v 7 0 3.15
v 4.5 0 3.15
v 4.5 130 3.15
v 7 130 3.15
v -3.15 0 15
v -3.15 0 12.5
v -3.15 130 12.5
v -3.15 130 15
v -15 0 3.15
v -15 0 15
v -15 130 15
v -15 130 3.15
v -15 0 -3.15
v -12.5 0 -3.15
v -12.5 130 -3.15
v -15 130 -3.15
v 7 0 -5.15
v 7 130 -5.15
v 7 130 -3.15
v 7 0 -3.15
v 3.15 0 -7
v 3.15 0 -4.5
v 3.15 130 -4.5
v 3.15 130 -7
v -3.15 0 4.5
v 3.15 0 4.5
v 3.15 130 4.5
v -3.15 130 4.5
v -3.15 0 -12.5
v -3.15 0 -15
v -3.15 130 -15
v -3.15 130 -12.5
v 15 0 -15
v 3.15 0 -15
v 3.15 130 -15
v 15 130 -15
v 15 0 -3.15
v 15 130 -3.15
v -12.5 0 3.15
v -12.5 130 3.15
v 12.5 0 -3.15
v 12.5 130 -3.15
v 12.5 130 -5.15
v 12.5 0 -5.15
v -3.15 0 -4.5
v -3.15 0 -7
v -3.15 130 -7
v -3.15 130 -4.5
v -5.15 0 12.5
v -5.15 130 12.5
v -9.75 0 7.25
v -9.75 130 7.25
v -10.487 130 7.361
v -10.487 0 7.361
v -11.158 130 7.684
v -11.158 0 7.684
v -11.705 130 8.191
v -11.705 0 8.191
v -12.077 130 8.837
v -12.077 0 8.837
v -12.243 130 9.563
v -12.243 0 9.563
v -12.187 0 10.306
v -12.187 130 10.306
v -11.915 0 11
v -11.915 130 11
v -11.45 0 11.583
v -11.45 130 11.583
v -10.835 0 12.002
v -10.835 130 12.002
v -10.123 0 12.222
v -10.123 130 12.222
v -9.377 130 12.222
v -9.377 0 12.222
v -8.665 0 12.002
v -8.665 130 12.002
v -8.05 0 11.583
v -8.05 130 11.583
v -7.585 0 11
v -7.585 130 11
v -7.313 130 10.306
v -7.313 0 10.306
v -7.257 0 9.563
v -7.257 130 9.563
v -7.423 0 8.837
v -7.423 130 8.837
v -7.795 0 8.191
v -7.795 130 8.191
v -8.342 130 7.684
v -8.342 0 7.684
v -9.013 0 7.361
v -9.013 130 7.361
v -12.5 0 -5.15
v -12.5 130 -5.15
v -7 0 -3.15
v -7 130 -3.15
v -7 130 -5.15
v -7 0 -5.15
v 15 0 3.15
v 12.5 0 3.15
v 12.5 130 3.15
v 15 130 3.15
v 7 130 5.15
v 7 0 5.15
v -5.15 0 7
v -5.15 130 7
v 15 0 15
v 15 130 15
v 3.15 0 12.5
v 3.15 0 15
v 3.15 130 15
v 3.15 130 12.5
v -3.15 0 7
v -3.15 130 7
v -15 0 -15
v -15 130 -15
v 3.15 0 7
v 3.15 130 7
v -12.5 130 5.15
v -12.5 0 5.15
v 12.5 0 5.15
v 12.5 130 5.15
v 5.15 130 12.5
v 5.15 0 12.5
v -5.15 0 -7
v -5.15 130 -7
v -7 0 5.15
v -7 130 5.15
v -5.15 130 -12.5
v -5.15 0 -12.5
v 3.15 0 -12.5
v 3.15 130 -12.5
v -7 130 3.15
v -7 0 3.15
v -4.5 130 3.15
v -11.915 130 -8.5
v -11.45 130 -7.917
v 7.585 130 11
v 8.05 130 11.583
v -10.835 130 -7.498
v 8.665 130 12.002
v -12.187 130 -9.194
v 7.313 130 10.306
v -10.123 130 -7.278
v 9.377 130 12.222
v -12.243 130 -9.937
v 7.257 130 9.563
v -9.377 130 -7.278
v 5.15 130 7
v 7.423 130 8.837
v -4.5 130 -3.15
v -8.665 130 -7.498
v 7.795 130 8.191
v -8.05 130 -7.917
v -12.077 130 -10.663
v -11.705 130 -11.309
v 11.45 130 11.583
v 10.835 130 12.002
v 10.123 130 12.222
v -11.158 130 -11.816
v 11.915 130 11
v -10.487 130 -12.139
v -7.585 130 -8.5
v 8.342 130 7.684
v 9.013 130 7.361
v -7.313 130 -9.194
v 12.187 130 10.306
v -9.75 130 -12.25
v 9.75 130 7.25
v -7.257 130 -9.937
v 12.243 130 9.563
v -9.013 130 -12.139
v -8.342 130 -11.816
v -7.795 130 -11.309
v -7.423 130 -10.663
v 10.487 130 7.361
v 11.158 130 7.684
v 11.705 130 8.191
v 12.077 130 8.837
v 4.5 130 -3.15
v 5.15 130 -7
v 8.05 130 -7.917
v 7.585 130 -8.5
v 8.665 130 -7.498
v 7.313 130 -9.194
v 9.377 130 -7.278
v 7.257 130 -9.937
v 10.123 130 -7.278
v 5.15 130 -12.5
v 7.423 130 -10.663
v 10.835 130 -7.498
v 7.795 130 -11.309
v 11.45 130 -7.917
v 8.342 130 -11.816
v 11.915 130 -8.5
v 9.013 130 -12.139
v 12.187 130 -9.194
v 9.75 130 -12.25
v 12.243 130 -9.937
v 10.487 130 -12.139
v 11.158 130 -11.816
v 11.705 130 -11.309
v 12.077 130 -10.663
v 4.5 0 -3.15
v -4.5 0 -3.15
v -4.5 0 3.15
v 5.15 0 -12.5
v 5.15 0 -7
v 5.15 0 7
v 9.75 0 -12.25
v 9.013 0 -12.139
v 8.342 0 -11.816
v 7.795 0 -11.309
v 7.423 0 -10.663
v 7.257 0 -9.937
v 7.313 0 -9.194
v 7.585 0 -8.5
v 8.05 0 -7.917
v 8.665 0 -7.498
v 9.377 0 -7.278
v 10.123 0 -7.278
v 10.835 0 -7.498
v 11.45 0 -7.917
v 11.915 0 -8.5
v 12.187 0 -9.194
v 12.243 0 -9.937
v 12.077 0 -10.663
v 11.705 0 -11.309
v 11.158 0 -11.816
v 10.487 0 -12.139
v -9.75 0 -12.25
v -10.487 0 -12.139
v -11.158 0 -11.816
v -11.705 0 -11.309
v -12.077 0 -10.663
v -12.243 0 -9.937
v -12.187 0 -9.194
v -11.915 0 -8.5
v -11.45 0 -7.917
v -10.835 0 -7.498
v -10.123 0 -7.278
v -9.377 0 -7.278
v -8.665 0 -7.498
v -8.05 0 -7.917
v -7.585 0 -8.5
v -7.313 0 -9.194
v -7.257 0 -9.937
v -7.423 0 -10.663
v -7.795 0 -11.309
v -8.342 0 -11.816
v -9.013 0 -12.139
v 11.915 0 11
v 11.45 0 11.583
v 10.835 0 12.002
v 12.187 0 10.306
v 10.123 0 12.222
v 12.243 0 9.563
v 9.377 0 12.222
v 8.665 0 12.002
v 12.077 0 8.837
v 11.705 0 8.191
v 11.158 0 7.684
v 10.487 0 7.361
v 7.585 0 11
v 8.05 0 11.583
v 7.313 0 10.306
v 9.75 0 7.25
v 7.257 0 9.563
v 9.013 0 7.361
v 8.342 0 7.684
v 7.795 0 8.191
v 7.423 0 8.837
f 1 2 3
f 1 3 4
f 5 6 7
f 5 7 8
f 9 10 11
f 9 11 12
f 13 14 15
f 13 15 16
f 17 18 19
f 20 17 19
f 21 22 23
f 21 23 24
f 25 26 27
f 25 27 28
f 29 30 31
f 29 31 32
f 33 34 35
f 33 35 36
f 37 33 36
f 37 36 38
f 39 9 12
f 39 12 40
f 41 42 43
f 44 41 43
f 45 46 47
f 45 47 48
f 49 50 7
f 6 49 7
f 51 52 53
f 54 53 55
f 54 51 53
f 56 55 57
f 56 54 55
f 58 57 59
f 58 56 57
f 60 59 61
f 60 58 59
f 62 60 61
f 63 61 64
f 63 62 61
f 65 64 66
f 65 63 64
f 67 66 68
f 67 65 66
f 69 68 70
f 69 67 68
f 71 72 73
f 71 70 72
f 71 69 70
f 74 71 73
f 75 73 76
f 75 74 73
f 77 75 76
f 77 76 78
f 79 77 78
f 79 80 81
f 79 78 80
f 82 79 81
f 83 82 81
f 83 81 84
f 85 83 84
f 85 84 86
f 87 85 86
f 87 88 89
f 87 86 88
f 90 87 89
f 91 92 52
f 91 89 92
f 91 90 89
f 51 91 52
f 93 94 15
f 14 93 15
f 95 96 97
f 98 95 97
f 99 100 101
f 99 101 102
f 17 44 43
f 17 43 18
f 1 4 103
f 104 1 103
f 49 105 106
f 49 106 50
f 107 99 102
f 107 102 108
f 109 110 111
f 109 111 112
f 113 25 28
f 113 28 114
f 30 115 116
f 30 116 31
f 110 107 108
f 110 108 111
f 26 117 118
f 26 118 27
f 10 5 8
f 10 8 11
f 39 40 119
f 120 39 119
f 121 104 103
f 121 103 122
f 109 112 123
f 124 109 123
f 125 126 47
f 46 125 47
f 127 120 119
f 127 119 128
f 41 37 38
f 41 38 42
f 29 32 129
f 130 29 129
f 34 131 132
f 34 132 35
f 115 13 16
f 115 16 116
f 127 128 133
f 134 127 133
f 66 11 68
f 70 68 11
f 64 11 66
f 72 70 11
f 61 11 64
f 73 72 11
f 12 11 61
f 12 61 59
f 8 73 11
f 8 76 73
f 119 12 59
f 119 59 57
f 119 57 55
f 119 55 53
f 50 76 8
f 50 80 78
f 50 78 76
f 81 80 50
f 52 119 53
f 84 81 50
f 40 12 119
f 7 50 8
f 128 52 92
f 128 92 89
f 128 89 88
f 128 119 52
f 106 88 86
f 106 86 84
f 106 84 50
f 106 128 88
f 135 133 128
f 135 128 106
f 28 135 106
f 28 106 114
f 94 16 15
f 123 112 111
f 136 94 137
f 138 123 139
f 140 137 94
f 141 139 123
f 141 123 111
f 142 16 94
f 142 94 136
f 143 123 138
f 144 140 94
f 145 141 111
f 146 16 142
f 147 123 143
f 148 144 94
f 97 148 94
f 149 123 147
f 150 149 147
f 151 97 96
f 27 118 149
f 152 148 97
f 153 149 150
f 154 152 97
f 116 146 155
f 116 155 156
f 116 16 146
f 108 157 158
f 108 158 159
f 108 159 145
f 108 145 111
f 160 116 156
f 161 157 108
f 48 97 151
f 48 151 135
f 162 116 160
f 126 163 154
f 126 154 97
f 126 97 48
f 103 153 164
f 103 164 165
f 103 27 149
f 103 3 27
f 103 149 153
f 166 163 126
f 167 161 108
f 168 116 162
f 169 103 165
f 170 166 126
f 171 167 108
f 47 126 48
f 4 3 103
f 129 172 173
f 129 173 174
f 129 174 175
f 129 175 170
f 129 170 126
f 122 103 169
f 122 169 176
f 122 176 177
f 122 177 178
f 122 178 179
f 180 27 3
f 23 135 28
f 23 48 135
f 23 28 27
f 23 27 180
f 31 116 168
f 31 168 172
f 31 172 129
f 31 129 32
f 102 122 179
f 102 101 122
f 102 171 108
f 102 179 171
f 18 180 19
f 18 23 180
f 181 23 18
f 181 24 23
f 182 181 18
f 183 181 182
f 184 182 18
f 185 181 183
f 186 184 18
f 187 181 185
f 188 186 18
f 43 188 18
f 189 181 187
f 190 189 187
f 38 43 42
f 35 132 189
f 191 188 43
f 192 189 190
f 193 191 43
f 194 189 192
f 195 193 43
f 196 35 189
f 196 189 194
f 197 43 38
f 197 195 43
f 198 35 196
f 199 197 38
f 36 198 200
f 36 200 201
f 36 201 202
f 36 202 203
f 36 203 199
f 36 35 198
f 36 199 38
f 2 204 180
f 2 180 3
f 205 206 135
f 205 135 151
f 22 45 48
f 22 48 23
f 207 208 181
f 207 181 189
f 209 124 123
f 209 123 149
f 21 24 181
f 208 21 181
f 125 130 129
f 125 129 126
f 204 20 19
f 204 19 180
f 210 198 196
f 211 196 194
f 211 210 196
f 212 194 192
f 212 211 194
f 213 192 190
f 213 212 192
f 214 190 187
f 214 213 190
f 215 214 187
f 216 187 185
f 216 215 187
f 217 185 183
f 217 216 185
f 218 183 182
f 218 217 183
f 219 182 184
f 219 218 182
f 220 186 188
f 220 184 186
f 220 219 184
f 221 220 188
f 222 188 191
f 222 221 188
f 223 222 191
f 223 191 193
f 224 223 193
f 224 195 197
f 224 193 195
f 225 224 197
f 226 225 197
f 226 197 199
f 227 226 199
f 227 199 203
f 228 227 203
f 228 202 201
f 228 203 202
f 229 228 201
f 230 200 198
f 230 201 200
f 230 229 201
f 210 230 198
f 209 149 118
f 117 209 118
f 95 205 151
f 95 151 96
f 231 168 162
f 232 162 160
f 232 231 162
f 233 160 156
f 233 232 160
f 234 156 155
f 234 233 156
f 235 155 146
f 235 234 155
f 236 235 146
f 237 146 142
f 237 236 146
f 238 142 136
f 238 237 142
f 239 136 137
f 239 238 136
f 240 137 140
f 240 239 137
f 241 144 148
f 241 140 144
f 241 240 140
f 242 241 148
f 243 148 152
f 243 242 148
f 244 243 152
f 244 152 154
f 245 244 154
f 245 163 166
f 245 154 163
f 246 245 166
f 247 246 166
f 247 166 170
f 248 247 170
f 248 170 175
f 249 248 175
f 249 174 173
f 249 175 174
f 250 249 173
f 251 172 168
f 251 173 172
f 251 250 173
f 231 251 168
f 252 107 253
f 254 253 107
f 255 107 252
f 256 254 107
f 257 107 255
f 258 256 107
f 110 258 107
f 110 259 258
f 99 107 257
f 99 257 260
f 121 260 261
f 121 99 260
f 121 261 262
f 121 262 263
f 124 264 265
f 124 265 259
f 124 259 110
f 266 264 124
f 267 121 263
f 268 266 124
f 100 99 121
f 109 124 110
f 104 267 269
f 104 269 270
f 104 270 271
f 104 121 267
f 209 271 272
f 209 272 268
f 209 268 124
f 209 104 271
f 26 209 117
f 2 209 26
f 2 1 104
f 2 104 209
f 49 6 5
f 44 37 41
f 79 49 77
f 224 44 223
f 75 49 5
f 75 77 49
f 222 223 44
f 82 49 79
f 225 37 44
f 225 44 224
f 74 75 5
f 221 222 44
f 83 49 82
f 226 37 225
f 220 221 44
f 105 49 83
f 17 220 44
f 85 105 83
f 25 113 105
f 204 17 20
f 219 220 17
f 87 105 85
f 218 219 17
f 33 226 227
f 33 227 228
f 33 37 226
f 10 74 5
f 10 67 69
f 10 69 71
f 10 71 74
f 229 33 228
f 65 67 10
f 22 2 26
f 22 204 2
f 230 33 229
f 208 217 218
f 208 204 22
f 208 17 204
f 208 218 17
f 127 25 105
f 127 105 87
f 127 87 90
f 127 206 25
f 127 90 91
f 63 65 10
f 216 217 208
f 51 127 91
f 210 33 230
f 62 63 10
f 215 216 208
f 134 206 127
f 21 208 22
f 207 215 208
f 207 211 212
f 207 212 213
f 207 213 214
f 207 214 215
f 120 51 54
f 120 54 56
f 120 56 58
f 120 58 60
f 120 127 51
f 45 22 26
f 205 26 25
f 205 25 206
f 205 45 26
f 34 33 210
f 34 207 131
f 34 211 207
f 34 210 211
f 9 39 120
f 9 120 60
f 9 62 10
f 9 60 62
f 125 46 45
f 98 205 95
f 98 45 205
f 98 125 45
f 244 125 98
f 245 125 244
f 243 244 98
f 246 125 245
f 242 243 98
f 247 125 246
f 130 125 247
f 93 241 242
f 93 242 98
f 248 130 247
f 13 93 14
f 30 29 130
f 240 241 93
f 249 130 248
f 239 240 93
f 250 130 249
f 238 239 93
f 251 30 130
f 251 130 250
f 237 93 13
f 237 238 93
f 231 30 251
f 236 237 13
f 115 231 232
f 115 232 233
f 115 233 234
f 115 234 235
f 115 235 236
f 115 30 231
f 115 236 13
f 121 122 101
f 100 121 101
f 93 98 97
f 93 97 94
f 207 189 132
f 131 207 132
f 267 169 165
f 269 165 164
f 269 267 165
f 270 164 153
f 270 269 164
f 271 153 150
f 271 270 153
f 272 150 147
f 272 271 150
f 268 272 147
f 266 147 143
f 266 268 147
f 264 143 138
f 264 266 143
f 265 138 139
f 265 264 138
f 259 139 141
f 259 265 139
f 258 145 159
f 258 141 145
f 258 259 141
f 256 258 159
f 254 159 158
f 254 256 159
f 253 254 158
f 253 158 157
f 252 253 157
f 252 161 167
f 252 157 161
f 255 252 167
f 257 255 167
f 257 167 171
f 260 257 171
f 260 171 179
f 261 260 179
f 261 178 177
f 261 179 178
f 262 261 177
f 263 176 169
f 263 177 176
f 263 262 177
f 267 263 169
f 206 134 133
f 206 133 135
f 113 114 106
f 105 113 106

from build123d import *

# Parameters (mm, degrees)
SKETCH_1_R          = 2.5
EXTRUDE_1_DEPTH     = 180
SKETCH_2_R          = 82.250528809
CUT_EXTRUDE_1_DEPTH = 10
SKETCH_3_R          = 47.359827943
CUT_EXTRUDE_2_DEPTH = 200
SKETCH_4_R          = 50.055938799
CUT_EXTRUDE_3_DEPTH = 30
SKETCH_5_R          = 35.776746529
CUT_EXTRUDE_4_DEPTH = 40
SKETCH_1_3_R        = 2.5
EXTRUDE_2_DEPTH     = 200
SKETCH_6_R          = 45.508426161
CUT_EXTRUDE_5_DEPTH = 50
SKETCH_7_R          = 85.251485325
CUT_EXTRUDE_7_DEPTH = 20


with BuildPart() as part:
    # 草图1 → 凸台-拉伸1 (new, symmetric)
    with BuildSketch(Plane(origin=(0, 0, 0), x_dir=(1, 0, 0), z_dir=(0, 1, 0))):
        Polygon((-15, -3.15), (-12.5, -3.15), (-12.5, -5.15), (-7, -5.15), (-7, -3.15), (-4.5, -3.15), (-4.5, 3.15), (-7, 3.15), (-7, 5.15), (-12.5, 5.15), (-12.5, 3.15), (-15, 3.15), (-15, 15), (-3.15, 15), (-3.15, 12.5), (-5.15, 12.5), (-5.15, 7), (-3.15, 7), (-3.15, 4.5), (3.15, 4.5), (3.15, 7), (5.15, 7), (5.15, 12.5), (3.15, 12.5), (3.15, 15), (15, 15), (15, 3.15), (12.5, 3.15), (12.5, 5.15), (7, 5.15), (7, 3.15), (4.5, 3.15), (4.5, -3.15), (7, -3.15), (7, -5.15), (12.5, -5.15), (12.5, -3.15), (15, -3.15), (15, -15), (3.15, -15), (3.15, -12.5), (5.15, -12.5), (5.15, -7), (3.15, -7), (3.15, -4.5), (-3.15, -4.5), (-3.15, -7), (-5.15, -7), (-5.15, -12.5), (-3.15, -12.5), (-3.15, -15), (-15, -15), align=None)
        with Locations((-9.75, -9.75)):
            Circle(SKETCH_1_R, mode=Mode.SUBTRACT)
        with Locations((-9.75, 9.75)):
            Circle(SKETCH_1_R, mode=Mode.SUBTRACT)
        with Locations((9.75, 9.75)):
            Circle(SKETCH_1_R, mode=Mode.SUBTRACT)
        with Locations((9.75, -9.75)):
            Circle(SKETCH_1_R, mode=Mode.SUBTRACT)
    extrude(amount=EXTRUDE_1_DEPTH, both=True)

    # 草图2 → 切除-拉伸1 (cut)
    with BuildSketch(Plane(origin=(0, 180, 0), x_dir=(1, 0, 0), z_dir=(0, 1, 0))):
        Circle(SKETCH_2_R)
    extrude(amount=-CUT_EXTRUDE_1_DEPTH, mode=Mode.SUBTRACT)

    # 草图3 → 切除-拉伸2 (cut)
    with BuildSketch(Plane.XZ.offset(180)):
        with Locations((0.216432031, -1.772037256)):
            Circle(SKETCH_3_R)
    extrude(amount=-CUT_EXTRUDE_2_DEPTH, mode=Mode.SUBTRACT)

    # 草图4 → 切除-拉伸3 (cut)
    with BuildSketch(Plane.XZ.offset(-20)):
        with Locations((-1.287426062, -1.543634952)):
            Circle(SKETCH_4_R)
    extrude(amount=-CUT_EXTRUDE_3_DEPTH, mode=Mode.SUBTRACT)

    # 草图5 → 切除-拉伸4 (cut)
    with BuildSketch(Plane.XZ.offset(-50)):
        with Locations((-0.979370242, 0.864150214)):
            Circle(SKETCH_5_R)
    extrude(amount=-CUT_EXTRUDE_4_DEPTH, mode=Mode.SUBTRACT)

    # 草图1<3> → 凸台-拉伸2 (add)
    with BuildSketch(Plane(origin=(0, 0, 0), x_dir=(1, 0, 0), z_dir=(0, 1, 0))):
        Polygon((-15, -3.15), (-12.5, -3.15), (-12.5, -5.15), (-7, -5.15), (-7, -3.15), (-4.5, -3.15), (-4.5, 3.15), (-7, 3.15), (-7, 5.15), (-12.5, 5.15), (-12.5, 3.15), (-15, 3.15), (-15, 15), (-3.15, 15), (-3.15, 12.5), (-5.15, 12.5), (-5.15, 7), (-3.15, 7), (-3.15, 4.5), (3.15, 4.5), (3.15, 7), (5.15, 7), (5.15, 12.5), (3.15, 12.5), (3.15, 15), (15, 15), (15, 3.15), (12.5, 3.15), (12.5, 5.15), (7, 5.15), (7, 3.15), (4.5, 3.15), (4.5, -3.15), (7, -3.15), (7, -5.15), (12.5, -5.15), (12.5, -3.15), (15, -3.15), (15, -15), (3.15, -15), (3.15, -12.5), (5.15, -12.5), (5.15, -7), (3.15, -7), (3.15, -4.5), (-3.15, -4.5), (-3.15, -7), (-5.15, -7), (-5.15, -12.5), (-3.15, -12.5), (-3.15, -15), (-15, -15), align=None)
        with Locations((-9.75, -9.75)):
            Circle(SKETCH_1_3_R, mode=Mode.SUBTRACT)
        with Locations((-9.75, 9.75)):
            Circle(SKETCH_1_3_R, mode=Mode.SUBTRACT)
        with Locations((9.75, 9.75)):
            Circle(SKETCH_1_3_R, mode=Mode.SUBTRACT)
        with Locations((9.75, -9.75)):
            Circle(SKETCH_1_3_R, mode=Mode.SUBTRACT)
    extrude(amount=EXTRUDE_2_DEPTH)

    # 草图6 → 切除-拉伸5 (cut)
    with BuildSketch(Plane(origin=(0, 200, 0), x_dir=(1, 0, 0), z_dir=(0, 1, 0))):
        with Locations((-0.666782572, 0.500086929)):
            Circle(SKETCH_6_R)
    extrude(amount=-CUT_EXTRUDE_5_DEPTH, mode=Mode.SUBTRACT)

    # 草图7 → 切除-拉伸7 (cut)
    with BuildSketch(Plane(origin=(0, 150, 0), x_dir=(1, 0, 0), z_dir=(0, 1, 0))):
        with Locations((0, -1.241240206)):
            Circle(SKETCH_7_R)
    extrude(amount=-CUT_EXTRUDE_7_DEPTH, mode=Mode.SUBTRACT)


solid = part.part
